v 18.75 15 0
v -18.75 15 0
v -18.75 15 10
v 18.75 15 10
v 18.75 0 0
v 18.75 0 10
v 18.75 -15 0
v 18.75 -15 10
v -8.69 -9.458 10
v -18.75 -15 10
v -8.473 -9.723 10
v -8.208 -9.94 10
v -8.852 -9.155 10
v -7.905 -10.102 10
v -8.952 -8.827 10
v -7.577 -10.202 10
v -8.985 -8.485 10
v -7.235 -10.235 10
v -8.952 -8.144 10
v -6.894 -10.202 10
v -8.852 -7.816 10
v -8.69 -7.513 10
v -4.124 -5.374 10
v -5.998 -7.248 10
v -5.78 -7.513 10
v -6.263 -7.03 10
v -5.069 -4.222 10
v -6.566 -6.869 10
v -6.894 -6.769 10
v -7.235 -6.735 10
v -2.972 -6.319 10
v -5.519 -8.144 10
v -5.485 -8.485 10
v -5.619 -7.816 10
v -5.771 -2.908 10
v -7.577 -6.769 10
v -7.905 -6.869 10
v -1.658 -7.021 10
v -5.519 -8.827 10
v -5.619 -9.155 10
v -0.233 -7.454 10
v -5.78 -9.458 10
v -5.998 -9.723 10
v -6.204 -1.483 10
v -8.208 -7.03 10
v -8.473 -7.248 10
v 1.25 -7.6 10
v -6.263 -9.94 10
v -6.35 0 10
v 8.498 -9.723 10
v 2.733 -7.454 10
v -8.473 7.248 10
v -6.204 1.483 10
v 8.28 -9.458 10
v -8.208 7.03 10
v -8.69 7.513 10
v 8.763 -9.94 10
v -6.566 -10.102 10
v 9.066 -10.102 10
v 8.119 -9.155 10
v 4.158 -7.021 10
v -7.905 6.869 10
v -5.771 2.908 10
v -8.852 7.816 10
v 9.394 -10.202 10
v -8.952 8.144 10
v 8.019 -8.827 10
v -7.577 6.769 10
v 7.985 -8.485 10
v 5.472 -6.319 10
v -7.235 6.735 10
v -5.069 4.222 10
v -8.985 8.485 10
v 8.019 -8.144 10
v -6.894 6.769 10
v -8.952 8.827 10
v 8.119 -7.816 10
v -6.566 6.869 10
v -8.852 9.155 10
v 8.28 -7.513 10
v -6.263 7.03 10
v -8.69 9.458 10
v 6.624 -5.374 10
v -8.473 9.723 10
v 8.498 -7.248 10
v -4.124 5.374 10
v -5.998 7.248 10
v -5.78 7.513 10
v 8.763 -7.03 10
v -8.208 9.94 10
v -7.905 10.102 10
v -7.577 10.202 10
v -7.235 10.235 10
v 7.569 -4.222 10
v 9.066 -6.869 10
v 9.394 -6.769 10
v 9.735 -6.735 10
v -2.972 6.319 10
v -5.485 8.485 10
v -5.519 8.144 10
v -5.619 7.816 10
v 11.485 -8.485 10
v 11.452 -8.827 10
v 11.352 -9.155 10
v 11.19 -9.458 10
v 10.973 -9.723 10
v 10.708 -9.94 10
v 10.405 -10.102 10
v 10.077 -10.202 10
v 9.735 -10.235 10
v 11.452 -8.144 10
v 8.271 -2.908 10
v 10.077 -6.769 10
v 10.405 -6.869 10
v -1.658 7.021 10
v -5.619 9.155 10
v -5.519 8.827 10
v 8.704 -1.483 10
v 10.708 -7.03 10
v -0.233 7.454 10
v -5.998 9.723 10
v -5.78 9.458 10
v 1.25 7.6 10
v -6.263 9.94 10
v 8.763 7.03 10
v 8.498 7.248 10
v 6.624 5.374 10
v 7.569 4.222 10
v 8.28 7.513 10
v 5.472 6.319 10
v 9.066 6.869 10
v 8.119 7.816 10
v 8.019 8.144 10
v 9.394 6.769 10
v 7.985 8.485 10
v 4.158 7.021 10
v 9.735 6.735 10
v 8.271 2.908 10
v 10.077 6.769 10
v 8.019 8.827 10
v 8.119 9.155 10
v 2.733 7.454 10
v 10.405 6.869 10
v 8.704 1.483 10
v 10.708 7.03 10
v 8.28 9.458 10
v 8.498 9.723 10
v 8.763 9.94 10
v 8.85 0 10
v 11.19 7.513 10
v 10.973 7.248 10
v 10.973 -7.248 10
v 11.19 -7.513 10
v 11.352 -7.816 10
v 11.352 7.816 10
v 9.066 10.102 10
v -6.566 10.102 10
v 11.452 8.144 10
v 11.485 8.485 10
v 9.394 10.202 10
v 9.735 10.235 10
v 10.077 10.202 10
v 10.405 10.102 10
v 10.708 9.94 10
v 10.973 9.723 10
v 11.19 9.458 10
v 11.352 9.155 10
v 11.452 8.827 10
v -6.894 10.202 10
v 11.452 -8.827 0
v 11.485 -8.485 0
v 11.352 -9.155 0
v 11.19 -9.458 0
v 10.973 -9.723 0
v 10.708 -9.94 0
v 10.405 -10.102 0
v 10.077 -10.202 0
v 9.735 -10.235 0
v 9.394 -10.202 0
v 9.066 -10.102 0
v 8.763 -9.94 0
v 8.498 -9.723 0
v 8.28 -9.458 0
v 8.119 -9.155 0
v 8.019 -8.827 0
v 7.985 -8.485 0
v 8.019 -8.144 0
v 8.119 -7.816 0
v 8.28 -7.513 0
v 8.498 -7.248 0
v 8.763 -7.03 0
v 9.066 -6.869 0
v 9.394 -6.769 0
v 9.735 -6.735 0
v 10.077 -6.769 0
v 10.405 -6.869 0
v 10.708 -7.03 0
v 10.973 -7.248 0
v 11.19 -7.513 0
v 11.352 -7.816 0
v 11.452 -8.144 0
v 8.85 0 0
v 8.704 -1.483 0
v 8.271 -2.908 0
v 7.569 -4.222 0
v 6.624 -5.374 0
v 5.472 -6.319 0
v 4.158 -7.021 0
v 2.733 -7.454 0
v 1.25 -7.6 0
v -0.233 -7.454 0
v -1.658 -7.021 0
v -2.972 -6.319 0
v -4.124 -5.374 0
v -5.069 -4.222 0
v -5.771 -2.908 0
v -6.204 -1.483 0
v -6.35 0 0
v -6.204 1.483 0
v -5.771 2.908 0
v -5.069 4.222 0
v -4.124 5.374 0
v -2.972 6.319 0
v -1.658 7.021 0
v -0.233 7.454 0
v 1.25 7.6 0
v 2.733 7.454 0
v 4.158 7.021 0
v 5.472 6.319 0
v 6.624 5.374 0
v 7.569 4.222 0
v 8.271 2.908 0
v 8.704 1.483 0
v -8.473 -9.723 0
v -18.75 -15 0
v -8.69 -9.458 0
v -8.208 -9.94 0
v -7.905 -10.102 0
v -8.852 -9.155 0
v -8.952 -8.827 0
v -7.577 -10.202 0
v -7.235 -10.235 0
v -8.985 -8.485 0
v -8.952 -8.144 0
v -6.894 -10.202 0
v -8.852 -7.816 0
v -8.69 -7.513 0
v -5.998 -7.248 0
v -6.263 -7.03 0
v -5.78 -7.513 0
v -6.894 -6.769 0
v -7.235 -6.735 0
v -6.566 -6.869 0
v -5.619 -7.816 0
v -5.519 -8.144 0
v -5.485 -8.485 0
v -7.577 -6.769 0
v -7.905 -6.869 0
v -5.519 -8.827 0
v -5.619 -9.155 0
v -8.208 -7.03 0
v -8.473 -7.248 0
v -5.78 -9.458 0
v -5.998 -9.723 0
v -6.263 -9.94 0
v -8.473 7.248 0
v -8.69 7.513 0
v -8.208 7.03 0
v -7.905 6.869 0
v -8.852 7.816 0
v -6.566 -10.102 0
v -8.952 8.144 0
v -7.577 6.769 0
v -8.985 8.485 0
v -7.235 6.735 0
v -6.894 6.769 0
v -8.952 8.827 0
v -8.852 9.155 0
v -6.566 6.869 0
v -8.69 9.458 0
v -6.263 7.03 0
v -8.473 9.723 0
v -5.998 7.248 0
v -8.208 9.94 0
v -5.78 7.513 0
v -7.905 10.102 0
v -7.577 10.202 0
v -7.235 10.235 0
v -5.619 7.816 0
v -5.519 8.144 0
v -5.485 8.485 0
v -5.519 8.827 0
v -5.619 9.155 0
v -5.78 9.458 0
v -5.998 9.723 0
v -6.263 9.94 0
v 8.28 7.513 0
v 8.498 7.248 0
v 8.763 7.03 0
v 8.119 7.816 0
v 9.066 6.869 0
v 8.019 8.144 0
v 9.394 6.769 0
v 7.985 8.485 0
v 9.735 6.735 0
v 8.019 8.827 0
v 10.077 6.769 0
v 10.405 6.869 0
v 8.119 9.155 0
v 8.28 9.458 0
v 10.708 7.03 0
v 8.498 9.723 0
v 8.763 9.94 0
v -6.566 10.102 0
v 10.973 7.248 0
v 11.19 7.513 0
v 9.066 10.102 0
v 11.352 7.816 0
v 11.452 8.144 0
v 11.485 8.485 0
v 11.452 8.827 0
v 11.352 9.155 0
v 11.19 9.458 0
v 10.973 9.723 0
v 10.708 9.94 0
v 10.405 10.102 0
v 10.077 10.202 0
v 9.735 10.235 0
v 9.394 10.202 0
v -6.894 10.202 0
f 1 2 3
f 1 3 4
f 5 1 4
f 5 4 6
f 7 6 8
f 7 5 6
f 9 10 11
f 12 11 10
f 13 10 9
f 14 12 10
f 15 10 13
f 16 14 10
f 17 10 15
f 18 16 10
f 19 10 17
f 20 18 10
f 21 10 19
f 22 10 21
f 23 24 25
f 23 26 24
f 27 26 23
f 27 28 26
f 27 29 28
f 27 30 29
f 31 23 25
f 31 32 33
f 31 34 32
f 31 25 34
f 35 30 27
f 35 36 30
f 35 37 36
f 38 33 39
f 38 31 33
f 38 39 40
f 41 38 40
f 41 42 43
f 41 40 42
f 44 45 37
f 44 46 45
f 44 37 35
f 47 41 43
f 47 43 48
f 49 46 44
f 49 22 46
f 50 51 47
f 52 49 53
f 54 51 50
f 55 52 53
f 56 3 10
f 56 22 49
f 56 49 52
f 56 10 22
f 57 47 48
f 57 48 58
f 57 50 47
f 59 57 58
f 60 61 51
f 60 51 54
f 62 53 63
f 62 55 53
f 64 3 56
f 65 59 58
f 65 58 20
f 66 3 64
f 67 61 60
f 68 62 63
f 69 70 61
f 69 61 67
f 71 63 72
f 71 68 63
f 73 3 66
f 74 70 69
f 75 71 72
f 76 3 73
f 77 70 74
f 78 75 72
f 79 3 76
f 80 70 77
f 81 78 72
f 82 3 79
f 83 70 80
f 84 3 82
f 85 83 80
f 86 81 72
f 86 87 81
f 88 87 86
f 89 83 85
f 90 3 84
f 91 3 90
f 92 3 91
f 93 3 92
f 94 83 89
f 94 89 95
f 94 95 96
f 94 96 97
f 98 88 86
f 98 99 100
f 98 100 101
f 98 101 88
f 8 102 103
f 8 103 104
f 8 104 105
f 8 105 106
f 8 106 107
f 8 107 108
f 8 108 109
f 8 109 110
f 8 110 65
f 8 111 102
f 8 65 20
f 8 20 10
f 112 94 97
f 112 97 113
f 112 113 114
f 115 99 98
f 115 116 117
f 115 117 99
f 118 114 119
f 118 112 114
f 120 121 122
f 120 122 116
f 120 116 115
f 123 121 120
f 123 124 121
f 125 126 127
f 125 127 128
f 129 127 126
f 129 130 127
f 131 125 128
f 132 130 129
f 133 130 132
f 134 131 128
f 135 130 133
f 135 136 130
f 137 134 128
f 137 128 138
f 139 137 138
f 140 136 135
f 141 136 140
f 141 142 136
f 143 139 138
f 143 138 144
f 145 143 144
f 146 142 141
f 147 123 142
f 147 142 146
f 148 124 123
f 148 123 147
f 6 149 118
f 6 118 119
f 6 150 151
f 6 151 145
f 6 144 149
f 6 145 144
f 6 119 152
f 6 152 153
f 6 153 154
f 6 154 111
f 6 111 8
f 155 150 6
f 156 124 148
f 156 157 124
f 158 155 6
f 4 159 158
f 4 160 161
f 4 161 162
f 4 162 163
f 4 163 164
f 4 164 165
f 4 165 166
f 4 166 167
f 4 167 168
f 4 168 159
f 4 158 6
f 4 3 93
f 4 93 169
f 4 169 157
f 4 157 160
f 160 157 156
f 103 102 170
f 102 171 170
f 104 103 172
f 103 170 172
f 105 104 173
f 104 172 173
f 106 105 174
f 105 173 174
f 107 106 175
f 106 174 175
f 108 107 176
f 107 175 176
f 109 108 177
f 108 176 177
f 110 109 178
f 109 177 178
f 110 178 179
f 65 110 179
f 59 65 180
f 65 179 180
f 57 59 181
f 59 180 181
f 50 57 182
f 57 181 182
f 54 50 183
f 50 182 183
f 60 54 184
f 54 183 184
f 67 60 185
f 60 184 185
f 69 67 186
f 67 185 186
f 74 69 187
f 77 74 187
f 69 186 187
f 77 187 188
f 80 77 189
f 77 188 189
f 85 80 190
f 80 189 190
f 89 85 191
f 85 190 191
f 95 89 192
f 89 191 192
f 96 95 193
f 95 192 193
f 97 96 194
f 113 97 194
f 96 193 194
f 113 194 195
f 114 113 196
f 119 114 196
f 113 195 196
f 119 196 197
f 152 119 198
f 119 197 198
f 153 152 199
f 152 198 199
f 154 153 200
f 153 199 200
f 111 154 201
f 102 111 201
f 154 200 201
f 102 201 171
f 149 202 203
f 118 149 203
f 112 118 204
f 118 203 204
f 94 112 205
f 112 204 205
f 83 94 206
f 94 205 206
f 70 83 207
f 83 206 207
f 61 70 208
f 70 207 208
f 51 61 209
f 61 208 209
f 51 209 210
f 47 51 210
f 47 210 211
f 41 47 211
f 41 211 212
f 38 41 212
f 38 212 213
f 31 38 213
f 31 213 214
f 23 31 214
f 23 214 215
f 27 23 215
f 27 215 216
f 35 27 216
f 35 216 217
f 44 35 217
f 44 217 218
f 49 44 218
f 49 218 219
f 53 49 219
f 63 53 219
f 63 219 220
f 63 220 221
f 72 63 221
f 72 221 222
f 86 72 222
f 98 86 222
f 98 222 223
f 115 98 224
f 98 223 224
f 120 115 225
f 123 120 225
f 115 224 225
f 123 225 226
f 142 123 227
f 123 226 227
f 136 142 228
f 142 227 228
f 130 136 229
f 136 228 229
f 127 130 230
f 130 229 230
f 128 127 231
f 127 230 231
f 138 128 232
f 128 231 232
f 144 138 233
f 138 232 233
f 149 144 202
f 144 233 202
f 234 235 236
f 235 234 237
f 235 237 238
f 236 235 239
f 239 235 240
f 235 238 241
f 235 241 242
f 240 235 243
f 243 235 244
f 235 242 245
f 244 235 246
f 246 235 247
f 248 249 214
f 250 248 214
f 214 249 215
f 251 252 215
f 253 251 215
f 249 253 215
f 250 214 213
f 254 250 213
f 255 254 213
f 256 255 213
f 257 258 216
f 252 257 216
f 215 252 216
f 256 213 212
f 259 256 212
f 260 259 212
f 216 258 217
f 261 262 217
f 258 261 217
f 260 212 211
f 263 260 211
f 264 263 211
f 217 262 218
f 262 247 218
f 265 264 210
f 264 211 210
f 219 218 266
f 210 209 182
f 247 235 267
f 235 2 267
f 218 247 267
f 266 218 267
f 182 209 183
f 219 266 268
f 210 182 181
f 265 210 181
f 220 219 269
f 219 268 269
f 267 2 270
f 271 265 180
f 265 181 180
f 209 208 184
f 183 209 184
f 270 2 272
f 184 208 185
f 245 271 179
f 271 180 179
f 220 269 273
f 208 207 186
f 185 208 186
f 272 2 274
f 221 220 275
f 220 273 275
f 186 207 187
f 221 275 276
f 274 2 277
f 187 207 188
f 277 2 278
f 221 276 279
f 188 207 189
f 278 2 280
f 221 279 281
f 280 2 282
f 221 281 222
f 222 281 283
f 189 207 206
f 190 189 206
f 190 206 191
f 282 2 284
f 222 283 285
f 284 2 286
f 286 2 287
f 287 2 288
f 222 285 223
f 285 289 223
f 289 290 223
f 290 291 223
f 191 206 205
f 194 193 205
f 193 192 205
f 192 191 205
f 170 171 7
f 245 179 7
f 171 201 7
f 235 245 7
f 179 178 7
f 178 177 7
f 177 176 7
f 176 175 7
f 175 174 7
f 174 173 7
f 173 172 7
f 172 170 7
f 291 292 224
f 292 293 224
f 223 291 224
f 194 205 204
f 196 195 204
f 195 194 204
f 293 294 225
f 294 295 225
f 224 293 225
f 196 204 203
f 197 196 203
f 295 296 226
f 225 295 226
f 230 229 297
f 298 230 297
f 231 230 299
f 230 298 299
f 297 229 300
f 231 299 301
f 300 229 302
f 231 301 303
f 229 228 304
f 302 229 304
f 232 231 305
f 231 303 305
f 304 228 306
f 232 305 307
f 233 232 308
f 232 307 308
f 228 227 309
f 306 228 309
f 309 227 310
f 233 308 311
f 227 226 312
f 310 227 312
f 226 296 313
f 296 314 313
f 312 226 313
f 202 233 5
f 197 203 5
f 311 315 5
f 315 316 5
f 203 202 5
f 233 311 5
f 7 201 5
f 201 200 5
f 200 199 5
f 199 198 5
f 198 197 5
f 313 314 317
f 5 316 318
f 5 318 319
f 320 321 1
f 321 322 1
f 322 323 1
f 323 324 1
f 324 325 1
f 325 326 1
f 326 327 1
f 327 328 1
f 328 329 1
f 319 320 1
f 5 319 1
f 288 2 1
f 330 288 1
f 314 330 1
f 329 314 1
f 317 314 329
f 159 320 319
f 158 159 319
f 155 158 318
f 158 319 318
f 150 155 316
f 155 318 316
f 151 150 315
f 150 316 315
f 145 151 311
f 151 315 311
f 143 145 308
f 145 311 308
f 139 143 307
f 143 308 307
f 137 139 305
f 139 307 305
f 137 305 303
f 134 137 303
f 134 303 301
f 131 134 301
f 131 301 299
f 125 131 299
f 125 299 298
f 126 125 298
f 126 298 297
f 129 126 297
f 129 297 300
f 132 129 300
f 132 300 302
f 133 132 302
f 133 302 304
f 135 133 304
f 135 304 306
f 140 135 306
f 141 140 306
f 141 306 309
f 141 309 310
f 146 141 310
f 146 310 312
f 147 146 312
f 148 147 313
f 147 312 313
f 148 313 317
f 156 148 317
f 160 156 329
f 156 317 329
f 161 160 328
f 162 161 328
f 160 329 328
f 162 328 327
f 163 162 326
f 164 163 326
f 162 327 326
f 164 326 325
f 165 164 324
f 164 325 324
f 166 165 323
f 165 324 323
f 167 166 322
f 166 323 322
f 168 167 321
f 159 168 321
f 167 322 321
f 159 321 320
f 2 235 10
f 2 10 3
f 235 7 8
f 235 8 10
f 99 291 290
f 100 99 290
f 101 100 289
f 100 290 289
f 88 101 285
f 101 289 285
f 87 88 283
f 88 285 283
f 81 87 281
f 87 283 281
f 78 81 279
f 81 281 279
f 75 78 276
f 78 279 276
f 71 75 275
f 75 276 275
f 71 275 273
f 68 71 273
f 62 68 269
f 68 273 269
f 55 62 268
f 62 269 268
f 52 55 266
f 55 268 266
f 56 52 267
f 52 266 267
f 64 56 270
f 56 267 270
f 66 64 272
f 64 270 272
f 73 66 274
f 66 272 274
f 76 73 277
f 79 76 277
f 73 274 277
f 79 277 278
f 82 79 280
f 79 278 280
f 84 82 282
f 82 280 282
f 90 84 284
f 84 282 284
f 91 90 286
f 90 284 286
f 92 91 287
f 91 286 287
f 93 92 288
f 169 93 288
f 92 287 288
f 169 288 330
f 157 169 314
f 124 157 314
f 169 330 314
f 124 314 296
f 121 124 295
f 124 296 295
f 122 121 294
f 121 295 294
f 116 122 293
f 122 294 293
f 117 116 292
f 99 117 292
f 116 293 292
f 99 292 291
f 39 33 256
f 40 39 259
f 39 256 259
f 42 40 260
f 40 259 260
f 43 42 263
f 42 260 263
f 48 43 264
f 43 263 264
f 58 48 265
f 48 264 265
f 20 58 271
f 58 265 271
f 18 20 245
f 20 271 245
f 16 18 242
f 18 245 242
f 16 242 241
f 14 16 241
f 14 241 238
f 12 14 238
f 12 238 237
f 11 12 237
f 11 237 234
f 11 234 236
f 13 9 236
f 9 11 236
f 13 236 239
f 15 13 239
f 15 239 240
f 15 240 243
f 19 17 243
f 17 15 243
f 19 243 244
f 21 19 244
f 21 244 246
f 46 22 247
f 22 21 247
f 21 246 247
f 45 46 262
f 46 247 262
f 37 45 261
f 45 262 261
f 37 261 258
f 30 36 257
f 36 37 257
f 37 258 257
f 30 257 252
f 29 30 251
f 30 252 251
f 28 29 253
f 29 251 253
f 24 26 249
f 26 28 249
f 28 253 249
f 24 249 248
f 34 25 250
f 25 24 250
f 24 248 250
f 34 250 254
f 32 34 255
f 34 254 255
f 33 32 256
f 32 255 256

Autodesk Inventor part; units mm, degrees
ref_plane "YZ Plane" through (0, 0, 0) normal (1, 0, 0) x (0, 1, 0)
ref_plane "XZ Plane" through (0, 0, 0) normal (0, 1, 0) x (-1, 0, 0)
ref_plane "XY Plane" through (0, 0, 0) normal (0, 0, 1) x (1, 0, 0)
sketch "Sketch1" plane through (0, 0, 0) normal (0, 0, 1) x (1, 0, 0)
  line L0 (-18.75, 15) -> (18.75, 15)
  line L1 (18.75, 15) -> (18.75, -15)
  line L2 (18.75, -15) -> (-18.75, -15)
  line L3 (-18.75, -15) -> (-18.75, 15)
  line L4 (-18.75, 15) -> (18.75, -15) construction
  line L5 (18.75, 15) -> (-18.75, -15) construction
  line L6 (18.75, 0) -> (1.25, 0)
  circle A0 centre (1.25, 0) radius 7.6
  circle A1 centre (1.25, 0) radius 12
  line L7 (-11.25, 12.5) -> (13.75, 12.5)
  line L8 (13.75, 12.5) -> (13.75, -12.5)
  line L9 (13.75, -12.5) -> (-11.25, -12.5)
  line L10 (-11.25, -12.5) -> (-11.25, 12.5)
  line L11 (-11.25, 12.5) -> (13.75, -12.5) construction
  line L12 (13.75, 12.5) -> (-11.25, -12.5) construction
  line L13 (13.75, 12.5) -> (-11.25, -12.5)
  circle A2 centre (9.7353, 8.4853) radius 1.75
  circle A3 centre (-7.2353, 8.4853) radius 1.75
  circle A4 centre (-7.2353, -8.4853) radius 1.75
  circle A5 centre (9.7353, -8.4853) radius 1.75
  point P0 (0, 0)
  dimension "d4" = 24
  dimension "d0" = 37.5
  dimension "d1" = 30
  dimension "d2" = 17.5
  dimension "d3" = 15.2
  dimension "d5" = 25
  dimension "d6" = 25
  dimension "d7" = 3.5
  dimension "d10" = 360
extrude "Extrusion1" add sketch "Sketch1" along normal blind 10 contours L8 L9 L13 A4 A1 A5 L6 | L6 A1 A2 L13 L8 | L0 L1 L2 L3 | A1 A5 A4 L13 A0 L6 | L6 A0 L13 A2 A1 | L13 A2 A1 A3 A4 L10 L7 | A0 L13 A4 A1 A3 A2
properties part number "POSIBLE CORTE"
